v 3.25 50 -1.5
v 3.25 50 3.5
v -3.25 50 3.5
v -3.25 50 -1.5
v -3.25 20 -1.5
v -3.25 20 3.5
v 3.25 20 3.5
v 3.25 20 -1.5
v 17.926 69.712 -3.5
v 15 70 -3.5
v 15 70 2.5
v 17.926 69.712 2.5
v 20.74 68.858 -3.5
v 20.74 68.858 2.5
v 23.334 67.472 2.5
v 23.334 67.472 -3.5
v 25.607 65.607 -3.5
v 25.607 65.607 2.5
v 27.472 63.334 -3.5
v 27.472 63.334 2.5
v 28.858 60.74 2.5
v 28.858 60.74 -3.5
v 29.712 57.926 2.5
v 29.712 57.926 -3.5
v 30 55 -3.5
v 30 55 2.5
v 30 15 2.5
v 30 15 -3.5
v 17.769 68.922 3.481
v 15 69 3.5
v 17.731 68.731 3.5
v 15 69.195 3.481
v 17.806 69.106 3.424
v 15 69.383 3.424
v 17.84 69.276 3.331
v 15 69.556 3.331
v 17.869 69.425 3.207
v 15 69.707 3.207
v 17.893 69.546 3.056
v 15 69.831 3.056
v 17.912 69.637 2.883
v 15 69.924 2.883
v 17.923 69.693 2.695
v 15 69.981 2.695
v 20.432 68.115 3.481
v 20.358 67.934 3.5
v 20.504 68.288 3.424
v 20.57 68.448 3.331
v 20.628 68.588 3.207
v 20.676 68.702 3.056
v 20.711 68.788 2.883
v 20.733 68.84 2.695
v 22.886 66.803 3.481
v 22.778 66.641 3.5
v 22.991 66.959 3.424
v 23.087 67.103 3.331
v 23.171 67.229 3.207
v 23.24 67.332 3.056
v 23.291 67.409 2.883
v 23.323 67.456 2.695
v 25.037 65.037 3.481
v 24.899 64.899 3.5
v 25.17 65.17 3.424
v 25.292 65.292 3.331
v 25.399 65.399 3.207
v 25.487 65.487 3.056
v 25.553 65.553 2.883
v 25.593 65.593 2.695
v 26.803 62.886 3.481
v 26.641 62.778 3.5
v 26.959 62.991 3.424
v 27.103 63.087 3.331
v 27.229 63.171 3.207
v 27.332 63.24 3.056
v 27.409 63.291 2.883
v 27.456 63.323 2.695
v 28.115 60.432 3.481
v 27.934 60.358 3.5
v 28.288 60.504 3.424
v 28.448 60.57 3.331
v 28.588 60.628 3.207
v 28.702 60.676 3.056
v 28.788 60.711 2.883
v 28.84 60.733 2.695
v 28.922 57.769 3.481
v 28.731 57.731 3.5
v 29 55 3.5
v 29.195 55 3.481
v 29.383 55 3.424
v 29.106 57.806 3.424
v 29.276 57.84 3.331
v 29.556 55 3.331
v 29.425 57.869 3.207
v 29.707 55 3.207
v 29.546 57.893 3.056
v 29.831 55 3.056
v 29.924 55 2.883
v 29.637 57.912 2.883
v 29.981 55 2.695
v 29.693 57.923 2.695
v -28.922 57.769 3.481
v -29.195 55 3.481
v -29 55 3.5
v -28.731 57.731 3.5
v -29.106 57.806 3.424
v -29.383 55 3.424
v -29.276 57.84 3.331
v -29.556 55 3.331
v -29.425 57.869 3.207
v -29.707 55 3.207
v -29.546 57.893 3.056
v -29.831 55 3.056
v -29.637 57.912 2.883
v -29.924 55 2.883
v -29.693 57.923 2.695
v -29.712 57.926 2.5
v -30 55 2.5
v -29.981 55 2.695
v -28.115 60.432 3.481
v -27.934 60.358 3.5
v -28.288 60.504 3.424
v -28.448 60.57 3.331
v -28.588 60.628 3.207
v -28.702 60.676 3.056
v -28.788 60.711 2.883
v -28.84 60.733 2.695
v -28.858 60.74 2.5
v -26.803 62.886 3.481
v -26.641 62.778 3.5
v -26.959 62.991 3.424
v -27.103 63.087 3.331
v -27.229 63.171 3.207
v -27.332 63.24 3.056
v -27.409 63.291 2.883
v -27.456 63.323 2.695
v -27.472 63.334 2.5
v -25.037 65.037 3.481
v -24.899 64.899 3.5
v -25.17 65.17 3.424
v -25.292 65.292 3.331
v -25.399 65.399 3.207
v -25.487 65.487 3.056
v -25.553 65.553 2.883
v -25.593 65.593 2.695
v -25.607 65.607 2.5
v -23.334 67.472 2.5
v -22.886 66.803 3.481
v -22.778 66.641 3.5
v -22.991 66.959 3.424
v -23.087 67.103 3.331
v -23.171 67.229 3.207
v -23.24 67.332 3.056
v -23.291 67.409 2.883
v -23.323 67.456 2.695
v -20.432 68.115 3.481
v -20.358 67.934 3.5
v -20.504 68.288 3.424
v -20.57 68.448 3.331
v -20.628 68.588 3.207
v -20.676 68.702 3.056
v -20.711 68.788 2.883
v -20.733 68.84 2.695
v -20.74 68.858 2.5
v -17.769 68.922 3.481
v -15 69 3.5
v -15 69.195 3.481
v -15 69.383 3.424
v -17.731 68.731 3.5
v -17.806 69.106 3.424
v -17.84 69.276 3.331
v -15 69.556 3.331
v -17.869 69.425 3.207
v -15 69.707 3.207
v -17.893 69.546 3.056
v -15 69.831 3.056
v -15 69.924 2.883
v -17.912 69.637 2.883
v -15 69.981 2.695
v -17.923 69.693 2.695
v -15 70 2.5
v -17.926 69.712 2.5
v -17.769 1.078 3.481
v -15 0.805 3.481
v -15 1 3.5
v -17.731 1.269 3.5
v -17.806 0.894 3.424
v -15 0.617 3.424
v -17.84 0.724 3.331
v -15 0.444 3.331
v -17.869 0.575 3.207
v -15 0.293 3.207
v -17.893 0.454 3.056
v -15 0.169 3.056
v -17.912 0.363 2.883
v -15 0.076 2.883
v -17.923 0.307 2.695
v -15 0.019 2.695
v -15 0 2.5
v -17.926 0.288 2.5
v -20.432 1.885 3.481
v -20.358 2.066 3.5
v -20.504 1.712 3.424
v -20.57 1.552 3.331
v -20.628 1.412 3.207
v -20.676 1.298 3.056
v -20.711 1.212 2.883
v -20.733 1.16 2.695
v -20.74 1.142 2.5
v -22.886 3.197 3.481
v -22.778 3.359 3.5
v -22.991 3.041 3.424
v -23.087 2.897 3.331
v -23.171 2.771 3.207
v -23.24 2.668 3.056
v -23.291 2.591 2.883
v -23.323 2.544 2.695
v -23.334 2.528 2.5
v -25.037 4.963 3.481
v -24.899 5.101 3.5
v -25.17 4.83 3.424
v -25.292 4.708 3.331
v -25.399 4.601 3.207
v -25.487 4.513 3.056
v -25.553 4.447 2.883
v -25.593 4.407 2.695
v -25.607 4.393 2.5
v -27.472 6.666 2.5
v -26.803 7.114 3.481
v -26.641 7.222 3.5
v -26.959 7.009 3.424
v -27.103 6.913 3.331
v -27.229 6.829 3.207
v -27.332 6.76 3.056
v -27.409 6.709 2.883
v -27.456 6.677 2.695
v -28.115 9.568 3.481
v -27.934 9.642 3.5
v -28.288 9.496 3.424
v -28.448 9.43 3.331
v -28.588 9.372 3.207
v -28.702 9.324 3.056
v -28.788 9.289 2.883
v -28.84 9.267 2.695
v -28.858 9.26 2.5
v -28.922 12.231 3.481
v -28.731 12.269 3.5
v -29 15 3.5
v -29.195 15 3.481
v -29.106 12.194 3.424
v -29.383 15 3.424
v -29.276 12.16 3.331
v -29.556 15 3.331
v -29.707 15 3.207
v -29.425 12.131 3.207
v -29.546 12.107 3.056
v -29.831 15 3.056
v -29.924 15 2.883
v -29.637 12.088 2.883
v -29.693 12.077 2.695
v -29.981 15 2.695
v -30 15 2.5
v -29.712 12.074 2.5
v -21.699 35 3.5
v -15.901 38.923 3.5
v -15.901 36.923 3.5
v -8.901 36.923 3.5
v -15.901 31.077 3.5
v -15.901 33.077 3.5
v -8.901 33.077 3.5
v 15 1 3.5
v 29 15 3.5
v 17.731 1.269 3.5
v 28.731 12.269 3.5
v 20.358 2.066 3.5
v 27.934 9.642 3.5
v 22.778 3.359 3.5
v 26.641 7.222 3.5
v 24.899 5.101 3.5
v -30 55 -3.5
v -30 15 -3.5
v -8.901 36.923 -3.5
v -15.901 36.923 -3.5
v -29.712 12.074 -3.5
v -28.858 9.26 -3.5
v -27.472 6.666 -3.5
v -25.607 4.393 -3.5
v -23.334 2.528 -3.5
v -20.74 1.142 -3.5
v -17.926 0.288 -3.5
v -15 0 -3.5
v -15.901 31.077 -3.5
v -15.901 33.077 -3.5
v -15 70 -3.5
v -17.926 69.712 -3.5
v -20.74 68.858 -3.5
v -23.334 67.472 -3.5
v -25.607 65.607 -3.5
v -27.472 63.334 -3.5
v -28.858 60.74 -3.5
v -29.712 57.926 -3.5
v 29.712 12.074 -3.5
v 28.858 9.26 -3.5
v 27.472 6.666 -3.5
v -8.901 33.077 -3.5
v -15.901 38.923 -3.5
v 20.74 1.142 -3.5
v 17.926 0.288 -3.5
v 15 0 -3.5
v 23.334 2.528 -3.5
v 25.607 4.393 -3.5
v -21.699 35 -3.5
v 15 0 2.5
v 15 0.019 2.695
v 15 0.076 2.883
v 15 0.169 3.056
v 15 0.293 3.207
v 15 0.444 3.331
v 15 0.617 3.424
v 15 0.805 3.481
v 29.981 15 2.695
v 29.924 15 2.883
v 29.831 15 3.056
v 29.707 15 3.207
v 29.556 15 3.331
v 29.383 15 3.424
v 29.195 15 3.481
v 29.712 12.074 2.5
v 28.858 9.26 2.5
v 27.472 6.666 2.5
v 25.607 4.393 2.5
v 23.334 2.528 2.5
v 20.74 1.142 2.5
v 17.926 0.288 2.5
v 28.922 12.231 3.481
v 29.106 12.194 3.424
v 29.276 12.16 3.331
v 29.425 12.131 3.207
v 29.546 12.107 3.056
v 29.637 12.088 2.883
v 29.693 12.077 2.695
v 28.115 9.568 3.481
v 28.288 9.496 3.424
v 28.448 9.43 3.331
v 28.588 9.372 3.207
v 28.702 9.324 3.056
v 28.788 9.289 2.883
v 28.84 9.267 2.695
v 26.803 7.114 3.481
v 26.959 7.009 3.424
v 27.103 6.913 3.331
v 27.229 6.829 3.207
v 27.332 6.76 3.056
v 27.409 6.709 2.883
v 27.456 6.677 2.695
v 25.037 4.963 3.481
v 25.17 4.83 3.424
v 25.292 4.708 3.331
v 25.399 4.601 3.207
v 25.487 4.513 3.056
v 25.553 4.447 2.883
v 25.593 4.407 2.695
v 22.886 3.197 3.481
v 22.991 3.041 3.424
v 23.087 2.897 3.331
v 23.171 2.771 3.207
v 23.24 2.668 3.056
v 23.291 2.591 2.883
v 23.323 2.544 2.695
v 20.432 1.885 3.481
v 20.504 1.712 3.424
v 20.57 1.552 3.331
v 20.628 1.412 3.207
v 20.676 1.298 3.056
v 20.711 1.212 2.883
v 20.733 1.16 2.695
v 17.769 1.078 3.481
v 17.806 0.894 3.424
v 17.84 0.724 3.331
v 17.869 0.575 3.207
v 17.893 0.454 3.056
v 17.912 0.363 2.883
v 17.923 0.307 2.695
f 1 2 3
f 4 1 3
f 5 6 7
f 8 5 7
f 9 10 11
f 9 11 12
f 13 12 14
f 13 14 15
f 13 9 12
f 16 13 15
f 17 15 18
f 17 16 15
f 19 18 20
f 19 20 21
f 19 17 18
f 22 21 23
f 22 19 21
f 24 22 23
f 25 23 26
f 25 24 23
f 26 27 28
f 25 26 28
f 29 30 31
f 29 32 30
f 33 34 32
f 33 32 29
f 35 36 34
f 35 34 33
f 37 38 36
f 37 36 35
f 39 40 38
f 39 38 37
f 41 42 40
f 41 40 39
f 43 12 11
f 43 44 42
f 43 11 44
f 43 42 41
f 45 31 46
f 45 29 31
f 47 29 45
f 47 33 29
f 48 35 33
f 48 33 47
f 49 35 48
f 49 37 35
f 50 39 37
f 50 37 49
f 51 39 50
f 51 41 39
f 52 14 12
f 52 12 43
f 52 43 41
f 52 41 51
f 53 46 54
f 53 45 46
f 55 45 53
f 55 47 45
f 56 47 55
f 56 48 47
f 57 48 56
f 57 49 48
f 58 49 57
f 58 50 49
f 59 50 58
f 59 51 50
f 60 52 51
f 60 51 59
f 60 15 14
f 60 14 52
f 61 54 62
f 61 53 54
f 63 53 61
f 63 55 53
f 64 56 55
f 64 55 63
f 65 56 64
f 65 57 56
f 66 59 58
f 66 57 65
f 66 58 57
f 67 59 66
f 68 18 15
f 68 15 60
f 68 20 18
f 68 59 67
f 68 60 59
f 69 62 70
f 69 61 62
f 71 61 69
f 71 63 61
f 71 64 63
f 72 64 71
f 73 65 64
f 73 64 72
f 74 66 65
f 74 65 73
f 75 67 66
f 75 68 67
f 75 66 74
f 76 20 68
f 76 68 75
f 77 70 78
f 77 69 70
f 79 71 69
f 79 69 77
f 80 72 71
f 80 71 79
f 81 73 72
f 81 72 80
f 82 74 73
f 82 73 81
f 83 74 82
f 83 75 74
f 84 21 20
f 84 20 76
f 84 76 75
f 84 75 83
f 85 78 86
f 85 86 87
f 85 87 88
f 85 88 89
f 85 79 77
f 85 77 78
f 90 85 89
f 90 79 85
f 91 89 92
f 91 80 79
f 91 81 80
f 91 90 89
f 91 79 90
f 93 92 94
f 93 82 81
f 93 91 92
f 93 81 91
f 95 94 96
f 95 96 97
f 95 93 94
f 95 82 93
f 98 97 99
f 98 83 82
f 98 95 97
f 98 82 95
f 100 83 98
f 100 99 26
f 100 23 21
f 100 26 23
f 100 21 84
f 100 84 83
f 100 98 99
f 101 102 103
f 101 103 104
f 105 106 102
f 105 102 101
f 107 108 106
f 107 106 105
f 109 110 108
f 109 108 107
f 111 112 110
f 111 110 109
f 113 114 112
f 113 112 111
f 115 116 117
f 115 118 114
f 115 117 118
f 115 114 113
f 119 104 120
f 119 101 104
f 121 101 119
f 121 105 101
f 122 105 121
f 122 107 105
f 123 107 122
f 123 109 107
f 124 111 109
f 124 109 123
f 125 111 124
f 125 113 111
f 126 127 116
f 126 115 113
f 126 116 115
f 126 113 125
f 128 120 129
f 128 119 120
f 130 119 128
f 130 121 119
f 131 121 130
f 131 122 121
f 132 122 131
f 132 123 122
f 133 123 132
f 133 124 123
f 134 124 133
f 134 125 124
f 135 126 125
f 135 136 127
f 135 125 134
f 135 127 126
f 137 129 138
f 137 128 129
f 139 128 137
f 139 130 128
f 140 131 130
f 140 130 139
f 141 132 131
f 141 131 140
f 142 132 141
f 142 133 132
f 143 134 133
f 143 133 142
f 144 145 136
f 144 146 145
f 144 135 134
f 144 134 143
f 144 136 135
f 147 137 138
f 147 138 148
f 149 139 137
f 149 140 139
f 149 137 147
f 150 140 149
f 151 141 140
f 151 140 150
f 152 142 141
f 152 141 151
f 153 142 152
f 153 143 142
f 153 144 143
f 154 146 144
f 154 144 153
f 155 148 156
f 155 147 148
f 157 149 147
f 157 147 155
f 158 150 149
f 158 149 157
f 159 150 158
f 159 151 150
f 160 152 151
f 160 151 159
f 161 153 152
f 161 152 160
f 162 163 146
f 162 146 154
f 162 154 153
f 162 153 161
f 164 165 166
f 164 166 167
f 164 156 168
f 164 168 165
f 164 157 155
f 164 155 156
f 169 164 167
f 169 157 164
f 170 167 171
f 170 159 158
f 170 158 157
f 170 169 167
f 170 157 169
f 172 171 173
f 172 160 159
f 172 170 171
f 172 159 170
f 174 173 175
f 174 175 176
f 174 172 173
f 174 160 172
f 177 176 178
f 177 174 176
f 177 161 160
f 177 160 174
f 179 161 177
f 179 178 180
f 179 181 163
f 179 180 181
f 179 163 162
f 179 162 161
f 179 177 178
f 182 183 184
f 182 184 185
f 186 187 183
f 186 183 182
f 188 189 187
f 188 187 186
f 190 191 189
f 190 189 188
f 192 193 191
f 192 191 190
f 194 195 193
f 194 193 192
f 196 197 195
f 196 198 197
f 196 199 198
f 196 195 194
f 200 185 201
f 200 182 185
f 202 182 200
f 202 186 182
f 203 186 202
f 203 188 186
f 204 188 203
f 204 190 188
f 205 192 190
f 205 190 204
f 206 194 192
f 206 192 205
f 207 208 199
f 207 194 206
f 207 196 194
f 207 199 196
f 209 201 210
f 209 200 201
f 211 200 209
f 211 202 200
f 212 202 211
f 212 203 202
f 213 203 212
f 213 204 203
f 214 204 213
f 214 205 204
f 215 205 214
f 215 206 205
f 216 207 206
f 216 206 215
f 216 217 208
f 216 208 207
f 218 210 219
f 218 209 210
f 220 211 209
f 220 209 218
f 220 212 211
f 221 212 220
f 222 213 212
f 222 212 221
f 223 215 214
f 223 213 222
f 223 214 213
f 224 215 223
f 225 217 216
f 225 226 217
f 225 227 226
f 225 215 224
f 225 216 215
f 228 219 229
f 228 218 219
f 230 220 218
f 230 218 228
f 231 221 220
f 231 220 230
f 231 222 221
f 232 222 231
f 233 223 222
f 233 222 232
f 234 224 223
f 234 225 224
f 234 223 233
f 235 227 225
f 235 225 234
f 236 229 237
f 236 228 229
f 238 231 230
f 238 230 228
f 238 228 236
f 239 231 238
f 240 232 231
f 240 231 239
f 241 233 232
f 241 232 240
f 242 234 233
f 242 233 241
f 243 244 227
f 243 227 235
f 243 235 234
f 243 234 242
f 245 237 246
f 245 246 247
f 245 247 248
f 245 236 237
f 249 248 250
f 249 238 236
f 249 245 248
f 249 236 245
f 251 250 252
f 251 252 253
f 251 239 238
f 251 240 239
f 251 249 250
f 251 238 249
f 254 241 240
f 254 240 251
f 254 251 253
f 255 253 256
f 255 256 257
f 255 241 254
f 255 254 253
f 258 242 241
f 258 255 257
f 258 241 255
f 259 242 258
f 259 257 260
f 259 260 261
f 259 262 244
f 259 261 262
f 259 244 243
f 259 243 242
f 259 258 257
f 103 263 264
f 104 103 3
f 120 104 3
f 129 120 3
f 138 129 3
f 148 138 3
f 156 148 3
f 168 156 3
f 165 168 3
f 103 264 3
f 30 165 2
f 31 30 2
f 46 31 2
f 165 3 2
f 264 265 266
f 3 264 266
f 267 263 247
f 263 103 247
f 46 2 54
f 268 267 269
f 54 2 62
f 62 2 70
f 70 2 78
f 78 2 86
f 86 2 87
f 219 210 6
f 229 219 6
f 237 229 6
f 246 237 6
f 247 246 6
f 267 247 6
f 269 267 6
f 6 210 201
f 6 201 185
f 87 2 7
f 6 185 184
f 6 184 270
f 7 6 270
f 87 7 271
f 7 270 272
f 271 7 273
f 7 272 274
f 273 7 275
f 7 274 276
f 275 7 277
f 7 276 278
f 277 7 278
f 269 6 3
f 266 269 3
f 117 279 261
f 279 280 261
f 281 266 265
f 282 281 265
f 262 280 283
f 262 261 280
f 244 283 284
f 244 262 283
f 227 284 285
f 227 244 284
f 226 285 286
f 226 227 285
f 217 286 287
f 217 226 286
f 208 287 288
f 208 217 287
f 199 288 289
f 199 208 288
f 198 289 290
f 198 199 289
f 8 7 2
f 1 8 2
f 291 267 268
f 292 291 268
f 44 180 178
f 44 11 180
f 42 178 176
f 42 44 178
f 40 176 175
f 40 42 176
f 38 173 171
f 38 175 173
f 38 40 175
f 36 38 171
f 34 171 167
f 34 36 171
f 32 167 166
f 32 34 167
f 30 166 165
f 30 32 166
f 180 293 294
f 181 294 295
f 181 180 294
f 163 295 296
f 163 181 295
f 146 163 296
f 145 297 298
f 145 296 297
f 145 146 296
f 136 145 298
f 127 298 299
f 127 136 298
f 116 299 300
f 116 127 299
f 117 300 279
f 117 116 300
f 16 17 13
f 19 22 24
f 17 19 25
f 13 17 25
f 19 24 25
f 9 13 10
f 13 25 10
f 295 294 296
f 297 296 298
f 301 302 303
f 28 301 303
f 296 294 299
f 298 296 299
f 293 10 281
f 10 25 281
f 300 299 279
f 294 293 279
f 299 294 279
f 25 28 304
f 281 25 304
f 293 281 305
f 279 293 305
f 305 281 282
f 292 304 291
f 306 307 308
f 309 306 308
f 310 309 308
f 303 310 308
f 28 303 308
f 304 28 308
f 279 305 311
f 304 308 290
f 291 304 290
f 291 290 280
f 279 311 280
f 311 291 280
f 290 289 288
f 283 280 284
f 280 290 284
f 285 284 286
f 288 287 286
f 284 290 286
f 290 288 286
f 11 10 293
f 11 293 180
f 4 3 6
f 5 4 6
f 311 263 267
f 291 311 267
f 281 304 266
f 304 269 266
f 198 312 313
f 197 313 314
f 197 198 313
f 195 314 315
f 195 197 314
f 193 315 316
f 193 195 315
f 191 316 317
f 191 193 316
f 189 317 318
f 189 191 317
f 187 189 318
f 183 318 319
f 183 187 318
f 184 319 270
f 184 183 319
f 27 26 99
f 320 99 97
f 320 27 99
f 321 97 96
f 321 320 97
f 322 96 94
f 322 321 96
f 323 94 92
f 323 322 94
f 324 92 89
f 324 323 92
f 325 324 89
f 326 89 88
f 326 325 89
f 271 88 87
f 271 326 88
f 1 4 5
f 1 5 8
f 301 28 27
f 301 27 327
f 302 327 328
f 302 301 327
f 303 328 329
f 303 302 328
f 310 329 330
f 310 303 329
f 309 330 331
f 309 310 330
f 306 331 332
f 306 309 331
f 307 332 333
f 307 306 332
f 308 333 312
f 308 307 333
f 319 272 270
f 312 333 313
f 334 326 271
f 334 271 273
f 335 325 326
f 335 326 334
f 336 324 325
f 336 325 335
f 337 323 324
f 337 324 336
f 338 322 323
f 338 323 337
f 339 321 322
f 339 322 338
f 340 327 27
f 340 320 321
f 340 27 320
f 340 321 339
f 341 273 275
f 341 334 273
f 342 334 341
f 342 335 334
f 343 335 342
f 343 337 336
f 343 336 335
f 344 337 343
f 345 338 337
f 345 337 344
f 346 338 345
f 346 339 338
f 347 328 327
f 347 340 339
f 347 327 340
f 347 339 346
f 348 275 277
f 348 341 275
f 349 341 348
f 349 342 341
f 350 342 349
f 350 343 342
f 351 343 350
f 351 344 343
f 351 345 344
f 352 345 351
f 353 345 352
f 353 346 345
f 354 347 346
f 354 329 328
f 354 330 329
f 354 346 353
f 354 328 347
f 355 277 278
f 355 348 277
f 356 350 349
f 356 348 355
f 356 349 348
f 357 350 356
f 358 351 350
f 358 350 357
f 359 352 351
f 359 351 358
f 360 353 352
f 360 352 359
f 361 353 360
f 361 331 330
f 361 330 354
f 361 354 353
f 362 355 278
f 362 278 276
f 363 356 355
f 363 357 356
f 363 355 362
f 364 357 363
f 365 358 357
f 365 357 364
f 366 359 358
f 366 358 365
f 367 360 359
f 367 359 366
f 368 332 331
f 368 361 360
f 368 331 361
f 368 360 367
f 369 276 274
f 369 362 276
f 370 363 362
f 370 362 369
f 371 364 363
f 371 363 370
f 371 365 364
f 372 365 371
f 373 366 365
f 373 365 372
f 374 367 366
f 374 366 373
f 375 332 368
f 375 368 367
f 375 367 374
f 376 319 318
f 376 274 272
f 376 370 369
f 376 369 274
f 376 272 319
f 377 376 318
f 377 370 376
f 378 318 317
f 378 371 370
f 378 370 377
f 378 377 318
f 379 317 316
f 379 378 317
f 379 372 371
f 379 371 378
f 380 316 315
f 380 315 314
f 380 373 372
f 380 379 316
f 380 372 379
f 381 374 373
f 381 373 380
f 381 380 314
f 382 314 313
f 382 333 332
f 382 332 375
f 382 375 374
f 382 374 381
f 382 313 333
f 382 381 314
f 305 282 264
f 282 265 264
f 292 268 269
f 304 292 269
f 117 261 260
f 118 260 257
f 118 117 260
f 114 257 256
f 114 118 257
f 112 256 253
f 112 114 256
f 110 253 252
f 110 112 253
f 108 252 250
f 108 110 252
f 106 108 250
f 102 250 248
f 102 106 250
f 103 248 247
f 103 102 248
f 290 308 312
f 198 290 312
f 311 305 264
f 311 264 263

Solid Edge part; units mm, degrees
sketch "Sketch1" plane through (0, 0, 0) normal (0, -1, 0) x (1, 0, 0)
  line L0 (-30, 3.5) -> (30, 3.5)
  line L1 (30, 3.5) -> (30, -3.5)
  line L2 (30, -3.5) -> (-30, -3.5)
  line L3 (-30, -3.5) -> (-30, 3.5)
  dimension "D1" = 60
  dimension "D2" = 7
extrude "Protrusion1" add sketch "Sketch1" against normal blind 70
sketch "Sketch2" plane through (0, 35, 3.5) normal (0, 0, 1) x (0, 1, 0)
  line L0 (15, 3.25) -> (-15, 3.25)
  line L1 (-15, 3.25) -> (-15, -3.25)
  line L2 (-15, -3.25) -> (15, -3.25)
  line L3 (15, -3.25) -> (15, 3.25)
  dimension "D1" = 30
  dimension "D2" = 6.5
  dimension "D3" = 20
extrude "Utskärning_för_vertikal_pelare" cut sketch "Sketch2" against normal blind 5
fillet "Avrundingar_15" radius 15 4 edges at (30, 70, 0) (-30, 70, 0) (-30, 0, 0) (30, 0, 0)
fillet "Avrundningar_1" radius 1 8 edges at (0, 70, 3.5) (-30, 35, 3.5) (30, 35, 3.5) (0, 0, 3.5) (-25.6066, 4.3934, 3.5) (25.6066, 4.3934, 3.5) (25.6066, 65.6066, 3.5) (-25.6066, 65.6066, 3.5)
sketch "Sketch3" plane through (0, 35, 3.5) normal (0, 0, 1) x (1, 0, 0)
  line L0 (-8.9011, -1.9226) -> (-8.9011, 1.9226)
  line L1 (-8.9011, 1.9226) -> (-15.9011, 1.9226)
  line L2 (-15.9011, 1.9226) -> (-15.9011, 3.9226)
  line L3 (-15.9011, 3.9226) -> (-21.6987, 0)
  line L4 (-21.6987, 0) -> (-15.9011, -3.9226)
  line L5 (-15.9011, -3.9226) -> (-15.9011, -1.9226)
  line L6 (-15.9011, -1.9226) -> (-8.9011, -1.9226)
  dimension "D1" = 7
  dimension "D2" = 2
  dimension "D3" = 7
  dimension "D4" = 3.8453
  dimension "D5" = 21.6987
extrude "Cutout1" cut sketch "Sketch3" against normal through all
